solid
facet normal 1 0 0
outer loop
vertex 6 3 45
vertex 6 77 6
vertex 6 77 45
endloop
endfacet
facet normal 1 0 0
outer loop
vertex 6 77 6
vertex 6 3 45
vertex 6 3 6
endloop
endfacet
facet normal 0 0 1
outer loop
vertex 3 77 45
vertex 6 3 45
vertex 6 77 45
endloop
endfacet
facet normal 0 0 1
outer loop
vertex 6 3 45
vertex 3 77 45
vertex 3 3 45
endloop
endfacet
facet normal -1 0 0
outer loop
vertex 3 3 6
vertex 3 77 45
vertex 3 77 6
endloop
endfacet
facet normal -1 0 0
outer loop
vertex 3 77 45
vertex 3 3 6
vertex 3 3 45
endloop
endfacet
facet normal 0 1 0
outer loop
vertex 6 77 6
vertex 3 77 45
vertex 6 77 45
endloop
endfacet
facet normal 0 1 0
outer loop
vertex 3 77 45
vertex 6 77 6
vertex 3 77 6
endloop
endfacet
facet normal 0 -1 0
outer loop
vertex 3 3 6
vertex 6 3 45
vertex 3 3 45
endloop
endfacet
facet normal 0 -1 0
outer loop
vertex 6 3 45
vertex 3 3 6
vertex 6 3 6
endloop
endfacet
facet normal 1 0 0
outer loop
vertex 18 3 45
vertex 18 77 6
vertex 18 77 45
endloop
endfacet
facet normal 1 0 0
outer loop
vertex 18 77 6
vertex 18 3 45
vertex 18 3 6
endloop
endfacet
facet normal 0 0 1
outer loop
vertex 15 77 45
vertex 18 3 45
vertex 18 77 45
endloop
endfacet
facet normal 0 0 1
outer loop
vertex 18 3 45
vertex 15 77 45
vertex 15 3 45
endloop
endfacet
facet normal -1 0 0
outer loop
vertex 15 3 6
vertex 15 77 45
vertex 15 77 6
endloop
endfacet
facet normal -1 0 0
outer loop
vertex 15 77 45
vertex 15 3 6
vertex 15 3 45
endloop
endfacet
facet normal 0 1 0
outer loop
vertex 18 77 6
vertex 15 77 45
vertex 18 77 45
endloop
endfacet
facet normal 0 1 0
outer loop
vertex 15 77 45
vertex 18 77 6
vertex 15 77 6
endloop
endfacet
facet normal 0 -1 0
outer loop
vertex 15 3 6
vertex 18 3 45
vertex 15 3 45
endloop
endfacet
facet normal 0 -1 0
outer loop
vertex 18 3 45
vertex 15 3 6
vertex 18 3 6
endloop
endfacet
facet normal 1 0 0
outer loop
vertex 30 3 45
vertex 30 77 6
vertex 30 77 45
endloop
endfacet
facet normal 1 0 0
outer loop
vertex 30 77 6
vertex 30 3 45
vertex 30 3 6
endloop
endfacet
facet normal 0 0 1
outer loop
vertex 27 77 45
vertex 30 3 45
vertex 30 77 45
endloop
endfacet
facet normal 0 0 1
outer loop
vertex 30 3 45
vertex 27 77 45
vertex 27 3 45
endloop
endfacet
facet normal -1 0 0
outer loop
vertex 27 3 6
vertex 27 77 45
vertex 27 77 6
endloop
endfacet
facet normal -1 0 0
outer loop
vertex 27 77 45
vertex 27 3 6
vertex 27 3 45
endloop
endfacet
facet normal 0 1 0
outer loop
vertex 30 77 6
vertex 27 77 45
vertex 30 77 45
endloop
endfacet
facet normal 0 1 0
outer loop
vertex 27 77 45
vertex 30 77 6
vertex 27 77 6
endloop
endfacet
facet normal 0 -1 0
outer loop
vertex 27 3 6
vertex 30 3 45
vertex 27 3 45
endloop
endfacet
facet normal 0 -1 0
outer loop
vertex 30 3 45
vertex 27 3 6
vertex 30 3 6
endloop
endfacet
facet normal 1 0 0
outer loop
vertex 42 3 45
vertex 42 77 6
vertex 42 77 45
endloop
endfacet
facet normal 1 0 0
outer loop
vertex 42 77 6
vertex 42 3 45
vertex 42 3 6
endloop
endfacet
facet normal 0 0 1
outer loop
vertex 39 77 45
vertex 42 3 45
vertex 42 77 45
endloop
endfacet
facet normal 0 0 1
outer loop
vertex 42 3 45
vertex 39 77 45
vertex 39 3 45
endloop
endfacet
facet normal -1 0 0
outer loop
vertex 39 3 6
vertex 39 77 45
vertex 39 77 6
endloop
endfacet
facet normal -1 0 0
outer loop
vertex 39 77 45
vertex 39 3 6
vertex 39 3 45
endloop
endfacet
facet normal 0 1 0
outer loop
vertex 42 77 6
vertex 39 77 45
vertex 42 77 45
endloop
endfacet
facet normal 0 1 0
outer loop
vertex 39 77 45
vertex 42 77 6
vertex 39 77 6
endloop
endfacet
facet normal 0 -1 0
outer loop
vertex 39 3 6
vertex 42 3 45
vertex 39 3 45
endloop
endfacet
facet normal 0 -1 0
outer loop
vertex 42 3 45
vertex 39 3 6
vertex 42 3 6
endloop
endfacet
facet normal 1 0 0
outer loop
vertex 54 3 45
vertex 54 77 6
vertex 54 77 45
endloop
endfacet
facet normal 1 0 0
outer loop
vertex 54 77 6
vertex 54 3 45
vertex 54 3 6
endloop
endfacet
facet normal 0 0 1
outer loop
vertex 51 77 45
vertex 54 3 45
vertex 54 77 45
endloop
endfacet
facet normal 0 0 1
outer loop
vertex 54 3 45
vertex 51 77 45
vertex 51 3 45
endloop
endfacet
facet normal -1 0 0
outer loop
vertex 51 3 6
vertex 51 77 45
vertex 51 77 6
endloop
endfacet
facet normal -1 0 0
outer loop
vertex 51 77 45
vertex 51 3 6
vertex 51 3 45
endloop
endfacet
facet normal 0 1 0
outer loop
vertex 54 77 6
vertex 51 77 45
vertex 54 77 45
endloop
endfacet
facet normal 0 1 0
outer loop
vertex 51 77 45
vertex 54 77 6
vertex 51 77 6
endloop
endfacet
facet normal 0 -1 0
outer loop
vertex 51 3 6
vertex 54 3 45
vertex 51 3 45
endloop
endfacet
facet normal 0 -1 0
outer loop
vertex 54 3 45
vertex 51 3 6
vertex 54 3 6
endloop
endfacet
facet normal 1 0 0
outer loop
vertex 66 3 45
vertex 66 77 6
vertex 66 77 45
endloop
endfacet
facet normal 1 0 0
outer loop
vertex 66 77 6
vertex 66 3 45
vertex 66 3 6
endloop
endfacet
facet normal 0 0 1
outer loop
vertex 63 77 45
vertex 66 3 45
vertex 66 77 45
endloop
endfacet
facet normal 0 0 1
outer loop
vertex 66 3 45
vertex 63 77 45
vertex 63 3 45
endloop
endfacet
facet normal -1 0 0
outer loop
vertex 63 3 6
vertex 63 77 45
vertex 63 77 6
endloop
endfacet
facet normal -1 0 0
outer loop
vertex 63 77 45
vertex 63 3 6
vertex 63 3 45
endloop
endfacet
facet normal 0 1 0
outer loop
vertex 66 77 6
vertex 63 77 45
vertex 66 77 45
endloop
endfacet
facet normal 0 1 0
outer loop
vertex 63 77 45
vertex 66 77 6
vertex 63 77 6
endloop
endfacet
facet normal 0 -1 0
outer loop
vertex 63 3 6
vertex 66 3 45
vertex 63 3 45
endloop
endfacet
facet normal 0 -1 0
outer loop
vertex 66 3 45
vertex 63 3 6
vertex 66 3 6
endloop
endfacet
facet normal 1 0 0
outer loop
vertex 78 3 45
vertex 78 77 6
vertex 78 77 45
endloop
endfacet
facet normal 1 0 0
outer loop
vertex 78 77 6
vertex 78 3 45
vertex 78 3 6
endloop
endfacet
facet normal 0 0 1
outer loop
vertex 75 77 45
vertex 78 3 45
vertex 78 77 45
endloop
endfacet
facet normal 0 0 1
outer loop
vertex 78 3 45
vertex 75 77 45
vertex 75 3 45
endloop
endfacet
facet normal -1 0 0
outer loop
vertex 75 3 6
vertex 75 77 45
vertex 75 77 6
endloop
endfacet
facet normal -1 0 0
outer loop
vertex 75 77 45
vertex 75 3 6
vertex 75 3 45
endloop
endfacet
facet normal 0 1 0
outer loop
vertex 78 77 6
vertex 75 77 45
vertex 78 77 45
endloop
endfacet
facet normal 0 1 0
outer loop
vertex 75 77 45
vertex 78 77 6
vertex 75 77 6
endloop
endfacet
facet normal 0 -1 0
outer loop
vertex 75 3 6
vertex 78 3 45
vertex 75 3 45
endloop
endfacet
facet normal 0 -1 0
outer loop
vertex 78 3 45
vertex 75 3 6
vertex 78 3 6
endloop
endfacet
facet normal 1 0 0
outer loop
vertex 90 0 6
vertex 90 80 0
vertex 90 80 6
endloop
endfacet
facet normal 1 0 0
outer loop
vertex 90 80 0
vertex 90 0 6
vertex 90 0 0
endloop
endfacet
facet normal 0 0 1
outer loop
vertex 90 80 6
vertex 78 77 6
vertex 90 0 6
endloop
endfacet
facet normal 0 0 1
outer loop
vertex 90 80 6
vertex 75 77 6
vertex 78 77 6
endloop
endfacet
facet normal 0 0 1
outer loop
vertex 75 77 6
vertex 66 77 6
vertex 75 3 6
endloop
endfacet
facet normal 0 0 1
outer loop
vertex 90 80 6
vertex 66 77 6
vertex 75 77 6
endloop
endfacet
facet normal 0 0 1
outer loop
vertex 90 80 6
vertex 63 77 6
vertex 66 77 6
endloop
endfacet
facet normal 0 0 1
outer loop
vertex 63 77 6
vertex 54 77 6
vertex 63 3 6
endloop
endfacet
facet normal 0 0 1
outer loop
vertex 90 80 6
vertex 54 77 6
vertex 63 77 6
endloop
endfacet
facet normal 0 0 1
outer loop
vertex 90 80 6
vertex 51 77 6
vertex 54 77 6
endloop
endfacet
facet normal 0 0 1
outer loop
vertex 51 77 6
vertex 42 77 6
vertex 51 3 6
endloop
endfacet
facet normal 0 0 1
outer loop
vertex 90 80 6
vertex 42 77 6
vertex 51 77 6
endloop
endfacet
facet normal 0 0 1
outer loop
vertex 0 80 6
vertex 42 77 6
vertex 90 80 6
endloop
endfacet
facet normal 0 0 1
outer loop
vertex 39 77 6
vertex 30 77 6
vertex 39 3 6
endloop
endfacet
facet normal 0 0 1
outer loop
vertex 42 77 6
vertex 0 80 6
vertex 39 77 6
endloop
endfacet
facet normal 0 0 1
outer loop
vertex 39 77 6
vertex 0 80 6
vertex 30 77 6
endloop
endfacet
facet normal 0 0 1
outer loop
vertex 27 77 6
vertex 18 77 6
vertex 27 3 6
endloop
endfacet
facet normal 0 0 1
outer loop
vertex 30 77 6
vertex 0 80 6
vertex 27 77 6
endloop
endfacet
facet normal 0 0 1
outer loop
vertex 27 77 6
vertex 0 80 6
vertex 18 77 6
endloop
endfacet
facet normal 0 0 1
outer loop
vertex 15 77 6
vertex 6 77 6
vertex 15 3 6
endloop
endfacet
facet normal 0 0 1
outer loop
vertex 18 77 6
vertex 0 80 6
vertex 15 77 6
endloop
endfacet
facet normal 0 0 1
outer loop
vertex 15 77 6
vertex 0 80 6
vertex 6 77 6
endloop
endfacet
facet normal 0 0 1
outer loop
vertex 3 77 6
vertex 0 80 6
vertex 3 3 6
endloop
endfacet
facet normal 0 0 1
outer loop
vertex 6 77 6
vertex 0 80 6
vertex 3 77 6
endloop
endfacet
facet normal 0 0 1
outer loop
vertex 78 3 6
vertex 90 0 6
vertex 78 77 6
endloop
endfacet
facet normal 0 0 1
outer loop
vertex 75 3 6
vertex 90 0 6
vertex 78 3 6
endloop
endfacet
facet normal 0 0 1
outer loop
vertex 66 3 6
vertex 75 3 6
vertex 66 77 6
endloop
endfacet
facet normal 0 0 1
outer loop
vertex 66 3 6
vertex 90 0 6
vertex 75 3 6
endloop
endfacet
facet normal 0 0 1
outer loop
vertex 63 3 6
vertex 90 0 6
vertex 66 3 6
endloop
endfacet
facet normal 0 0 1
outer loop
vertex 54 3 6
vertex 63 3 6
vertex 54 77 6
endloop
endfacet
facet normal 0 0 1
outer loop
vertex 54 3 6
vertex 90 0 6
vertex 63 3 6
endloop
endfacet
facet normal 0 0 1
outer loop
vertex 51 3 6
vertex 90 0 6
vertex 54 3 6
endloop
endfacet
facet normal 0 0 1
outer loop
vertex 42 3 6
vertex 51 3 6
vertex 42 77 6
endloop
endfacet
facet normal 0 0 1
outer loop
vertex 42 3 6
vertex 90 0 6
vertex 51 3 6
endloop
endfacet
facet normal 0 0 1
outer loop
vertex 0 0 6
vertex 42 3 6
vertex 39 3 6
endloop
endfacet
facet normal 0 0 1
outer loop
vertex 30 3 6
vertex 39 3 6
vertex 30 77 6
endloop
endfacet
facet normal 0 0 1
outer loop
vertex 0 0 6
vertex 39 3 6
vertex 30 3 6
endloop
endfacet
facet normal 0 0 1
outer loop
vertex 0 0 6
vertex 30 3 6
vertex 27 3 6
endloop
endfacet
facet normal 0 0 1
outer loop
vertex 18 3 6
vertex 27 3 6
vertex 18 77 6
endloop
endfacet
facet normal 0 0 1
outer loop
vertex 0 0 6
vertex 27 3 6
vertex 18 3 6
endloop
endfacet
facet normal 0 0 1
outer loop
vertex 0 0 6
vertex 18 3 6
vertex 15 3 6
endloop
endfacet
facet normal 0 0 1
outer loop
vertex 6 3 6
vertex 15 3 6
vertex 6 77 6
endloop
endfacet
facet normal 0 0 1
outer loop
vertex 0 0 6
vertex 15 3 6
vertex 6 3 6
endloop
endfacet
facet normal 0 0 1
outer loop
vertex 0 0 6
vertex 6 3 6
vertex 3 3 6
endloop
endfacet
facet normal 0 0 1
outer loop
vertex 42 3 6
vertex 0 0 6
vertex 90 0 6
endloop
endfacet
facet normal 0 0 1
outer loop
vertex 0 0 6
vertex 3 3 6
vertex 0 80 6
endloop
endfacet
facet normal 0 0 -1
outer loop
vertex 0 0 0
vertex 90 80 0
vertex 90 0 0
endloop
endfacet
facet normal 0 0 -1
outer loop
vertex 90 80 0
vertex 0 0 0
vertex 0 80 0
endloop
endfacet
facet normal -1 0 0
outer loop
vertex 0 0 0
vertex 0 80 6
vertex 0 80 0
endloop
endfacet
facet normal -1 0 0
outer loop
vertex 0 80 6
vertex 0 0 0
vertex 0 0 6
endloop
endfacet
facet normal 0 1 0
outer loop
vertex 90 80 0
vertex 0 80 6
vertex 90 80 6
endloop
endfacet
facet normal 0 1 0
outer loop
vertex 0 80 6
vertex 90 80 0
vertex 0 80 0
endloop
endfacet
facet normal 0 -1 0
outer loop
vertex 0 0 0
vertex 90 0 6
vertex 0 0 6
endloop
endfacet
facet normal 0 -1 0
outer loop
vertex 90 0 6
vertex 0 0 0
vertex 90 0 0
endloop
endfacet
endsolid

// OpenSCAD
$fn = 32;

// ----------------------------------------------------------------------
// Heatsink: uniform fin block
// ----------------------------------------------------------------------

// --- parameters (mm) ---
base_l = 90;              // base length, X
base_w = 80;              // base width, Y
base_t = 6;               // base plate thickness
fin_h = 40;               // fin height above the base
fin_t = 3;                // fin thickness
edge = 3;                 // margin from the base ends
pitch = 12;               // fin pitch

n_fins = floor((base_l - 2 * edge - fin_t) / pitch) + 1;  // fin count
total_h = base_t + fin_h - 1;  // overall height

union() {
  cube([base_l, base_w, base_t]);
  for (i = [0 : n_fins - 1])
    translate([edge + i * pitch, edge, base_t - 1])
      cube([fin_t, base_w - 2 * edge, fin_h]);
}
